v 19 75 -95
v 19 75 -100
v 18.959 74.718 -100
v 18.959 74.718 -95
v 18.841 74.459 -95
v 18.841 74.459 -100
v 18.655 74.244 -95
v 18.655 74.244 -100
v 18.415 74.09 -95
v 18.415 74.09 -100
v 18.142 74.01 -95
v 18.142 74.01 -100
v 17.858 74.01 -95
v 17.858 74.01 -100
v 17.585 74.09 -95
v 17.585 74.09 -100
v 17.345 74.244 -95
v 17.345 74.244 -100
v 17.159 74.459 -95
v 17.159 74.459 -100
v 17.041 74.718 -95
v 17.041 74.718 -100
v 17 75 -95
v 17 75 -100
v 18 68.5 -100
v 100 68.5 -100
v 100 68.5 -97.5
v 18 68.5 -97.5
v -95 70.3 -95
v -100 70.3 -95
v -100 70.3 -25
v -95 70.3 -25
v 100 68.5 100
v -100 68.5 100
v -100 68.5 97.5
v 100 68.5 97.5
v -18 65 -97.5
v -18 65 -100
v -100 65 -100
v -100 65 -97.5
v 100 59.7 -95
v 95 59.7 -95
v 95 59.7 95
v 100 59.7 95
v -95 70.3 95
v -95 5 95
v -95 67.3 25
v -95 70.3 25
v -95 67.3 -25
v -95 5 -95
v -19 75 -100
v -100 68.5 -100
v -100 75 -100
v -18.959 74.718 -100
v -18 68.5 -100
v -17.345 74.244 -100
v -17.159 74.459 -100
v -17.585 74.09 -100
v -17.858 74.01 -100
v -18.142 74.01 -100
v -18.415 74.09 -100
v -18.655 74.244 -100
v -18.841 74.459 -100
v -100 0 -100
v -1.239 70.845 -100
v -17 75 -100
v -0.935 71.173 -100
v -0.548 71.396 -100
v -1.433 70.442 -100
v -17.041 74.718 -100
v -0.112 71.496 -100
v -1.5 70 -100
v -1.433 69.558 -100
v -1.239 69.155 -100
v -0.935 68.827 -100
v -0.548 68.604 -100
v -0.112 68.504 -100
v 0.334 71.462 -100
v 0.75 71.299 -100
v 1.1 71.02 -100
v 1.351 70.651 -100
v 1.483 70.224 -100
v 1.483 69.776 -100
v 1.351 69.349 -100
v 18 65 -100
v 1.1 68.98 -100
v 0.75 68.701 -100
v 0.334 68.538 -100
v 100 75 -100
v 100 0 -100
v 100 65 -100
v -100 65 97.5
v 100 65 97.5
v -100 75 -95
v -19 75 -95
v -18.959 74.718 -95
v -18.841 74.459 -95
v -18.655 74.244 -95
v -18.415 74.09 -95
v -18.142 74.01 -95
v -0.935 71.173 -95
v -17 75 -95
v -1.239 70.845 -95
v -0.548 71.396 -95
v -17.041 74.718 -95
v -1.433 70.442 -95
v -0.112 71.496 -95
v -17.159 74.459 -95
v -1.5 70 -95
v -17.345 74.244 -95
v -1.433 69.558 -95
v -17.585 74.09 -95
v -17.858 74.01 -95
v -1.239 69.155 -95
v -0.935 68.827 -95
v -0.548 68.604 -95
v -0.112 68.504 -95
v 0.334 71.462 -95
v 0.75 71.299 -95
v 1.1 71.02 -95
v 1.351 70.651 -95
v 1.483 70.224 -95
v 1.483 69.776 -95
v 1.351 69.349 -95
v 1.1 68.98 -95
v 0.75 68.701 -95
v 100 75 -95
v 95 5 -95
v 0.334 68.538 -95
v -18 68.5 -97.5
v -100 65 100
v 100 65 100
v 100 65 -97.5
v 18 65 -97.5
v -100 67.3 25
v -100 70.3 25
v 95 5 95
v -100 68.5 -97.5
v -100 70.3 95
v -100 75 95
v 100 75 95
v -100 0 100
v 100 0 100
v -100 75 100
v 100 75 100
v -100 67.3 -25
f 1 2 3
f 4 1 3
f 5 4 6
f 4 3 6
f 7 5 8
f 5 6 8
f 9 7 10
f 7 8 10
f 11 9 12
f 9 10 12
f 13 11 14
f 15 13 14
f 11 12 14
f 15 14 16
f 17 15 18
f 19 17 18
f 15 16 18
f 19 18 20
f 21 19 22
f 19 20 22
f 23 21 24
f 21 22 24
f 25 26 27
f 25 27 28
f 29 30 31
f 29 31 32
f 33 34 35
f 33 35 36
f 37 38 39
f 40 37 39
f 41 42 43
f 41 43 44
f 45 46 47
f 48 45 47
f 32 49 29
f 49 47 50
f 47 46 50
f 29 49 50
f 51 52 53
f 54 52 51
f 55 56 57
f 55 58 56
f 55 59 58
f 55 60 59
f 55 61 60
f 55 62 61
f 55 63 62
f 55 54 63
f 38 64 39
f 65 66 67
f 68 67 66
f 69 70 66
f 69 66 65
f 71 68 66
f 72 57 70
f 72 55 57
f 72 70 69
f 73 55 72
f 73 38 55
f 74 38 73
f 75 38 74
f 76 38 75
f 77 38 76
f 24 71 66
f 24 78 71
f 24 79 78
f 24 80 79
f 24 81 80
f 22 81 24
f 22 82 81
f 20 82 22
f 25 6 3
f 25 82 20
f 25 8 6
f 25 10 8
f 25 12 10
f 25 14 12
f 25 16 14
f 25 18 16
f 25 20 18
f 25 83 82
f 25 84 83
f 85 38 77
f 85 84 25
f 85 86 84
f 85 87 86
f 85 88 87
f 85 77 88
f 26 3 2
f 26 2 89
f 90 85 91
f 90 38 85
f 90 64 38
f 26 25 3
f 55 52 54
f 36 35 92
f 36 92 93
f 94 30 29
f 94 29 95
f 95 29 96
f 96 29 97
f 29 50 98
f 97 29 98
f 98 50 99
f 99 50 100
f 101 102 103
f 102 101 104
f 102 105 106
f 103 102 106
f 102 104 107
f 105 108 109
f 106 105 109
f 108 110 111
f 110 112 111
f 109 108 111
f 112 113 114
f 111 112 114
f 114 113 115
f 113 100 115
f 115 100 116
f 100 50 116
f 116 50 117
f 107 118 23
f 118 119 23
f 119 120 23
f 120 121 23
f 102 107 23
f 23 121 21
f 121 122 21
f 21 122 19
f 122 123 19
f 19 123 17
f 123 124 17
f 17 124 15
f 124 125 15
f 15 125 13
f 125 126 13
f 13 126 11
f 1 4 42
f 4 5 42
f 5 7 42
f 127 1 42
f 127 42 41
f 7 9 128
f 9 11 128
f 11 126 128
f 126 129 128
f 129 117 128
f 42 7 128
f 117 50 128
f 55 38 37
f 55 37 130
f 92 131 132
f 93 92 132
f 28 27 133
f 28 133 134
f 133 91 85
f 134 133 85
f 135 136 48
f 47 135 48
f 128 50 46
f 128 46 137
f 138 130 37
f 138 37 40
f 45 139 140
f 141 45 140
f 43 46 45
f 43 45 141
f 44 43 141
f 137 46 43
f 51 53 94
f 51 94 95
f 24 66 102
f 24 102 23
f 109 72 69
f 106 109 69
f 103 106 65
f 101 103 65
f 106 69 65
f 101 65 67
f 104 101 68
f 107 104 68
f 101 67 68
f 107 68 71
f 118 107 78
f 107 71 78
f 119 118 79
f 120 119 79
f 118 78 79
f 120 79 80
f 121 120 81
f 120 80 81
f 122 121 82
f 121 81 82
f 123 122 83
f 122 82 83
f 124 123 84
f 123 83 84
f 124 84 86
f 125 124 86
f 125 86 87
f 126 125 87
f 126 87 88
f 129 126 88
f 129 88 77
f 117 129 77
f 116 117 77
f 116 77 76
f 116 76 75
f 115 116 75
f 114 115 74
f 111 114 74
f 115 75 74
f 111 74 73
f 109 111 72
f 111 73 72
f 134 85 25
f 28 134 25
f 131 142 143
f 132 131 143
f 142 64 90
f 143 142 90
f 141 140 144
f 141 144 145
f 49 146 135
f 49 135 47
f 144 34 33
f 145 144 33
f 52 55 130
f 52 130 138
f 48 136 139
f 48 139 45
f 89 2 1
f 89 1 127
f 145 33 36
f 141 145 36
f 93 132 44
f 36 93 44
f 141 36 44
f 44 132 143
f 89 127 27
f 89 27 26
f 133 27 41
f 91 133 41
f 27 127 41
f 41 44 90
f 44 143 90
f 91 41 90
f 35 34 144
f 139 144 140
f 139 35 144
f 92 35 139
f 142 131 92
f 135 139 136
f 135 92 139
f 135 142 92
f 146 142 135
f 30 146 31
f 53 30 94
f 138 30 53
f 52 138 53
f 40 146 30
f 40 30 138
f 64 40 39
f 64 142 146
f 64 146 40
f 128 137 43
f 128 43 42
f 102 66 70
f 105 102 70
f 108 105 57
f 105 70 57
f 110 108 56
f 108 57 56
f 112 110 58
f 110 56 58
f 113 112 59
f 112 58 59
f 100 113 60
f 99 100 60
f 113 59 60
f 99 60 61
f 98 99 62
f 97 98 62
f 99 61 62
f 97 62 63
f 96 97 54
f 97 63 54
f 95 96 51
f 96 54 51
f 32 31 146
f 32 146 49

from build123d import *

# Parameters (mm, degrees)
SKETCH_1_W               = 200
SKETCH_1_H               = 200
EXTRUDE_2_DEPTH          = 5
SKETCH_2_W               = 200
SKETCH_2_H               = 5
EXTRUDE_3_DEPTH          = 70
SKETCH_3_W               = 5
SKETCH_3_H               = 190
EXTRUDE_4_DEPTH          = 54.7
SKETCH_4_W               = 200
SKETCH_4_H               = 5
EXTRUDE_5_DEPTH          = 70
SKETCH_14_W              = 5
SKETCH_14_H              = 190
EXTRUDE_7_DEPTH          = 65.3
SKETCH_15_W              = 5
SKETCH_15_H              = 50
CUT_EXTRUDE_7_DEPTH      = 3
CUT_EXTRUDE_8_DEPTH      = 1
CUT_EXTRUDE_8_DEPTH_BACK = 5
CUT_EXTRUDE_9_DEPTH      = 1
CUT_EXTRUDE_9_DEPTH_BACK = 5
SKETCH_19_R              = 1.5
CUT_EXTRUDE_10_DEPTH     = 5
SKETCH_20_W              = 200
SKETCH_20_H              = 3.5
CUT_EXTRUDE_11_DEPTH     = 2.5
SKETCH_21_W              = 82
SKETCH_21_H              = 3.5
CUT_EXTRUDE_13_DEPTH     = 2.5


with BuildPart() as part:
    # Эскиз1 → Бобышка-Вытянуть2 (new body)
    with BuildSketch(Plane(origin=(0, 0, 0), x_dir=(1, 0, 0), z_dir=(0, 1, 0))):
        Rectangle(SKETCH_1_W, SKETCH_1_H)
    extrude(amount=EXTRUDE_2_DEPTH)

    # Эскиз2 → Бобышка-Вытянуть3 (add)
    with BuildSketch(Plane(origin=(0, 5, 0), x_dir=(1, 0, 0), z_dir=(0, 1, 0))):
        with Locations((0, -97.5)):
            Rectangle(SKETCH_2_W, SKETCH_2_H)
    extrude(amount=EXTRUDE_3_DEPTH)

    # Эскиз3 → Бобышка-Вытянуть4 (add)
    with BuildSketch(Plane(origin=(0, 5, 0), x_dir=(1, 0, 0), z_dir=(0, 1, 0))):
        with Locations((97.5, 0)):
            Rectangle(SKETCH_3_W, SKETCH_3_H)
    extrude(amount=EXTRUDE_4_DEPTH)

    # Эскиз4 → Бобышка-Вытянуть5 (add)
    with BuildSketch(Plane(origin=(0, 5, 0), x_dir=(1, 0, 0), z_dir=(0, 1, 0))):
        with Locations((0, 97.5)):
            Rectangle(SKETCH_4_W, SKETCH_4_H)
    extrude(amount=EXTRUDE_5_DEPTH)

    # Эскиз14 → Бобышка-Вытянуть7 (add)
    with BuildSketch(Plane(origin=(0, 5, 0), x_dir=(1, 0, 0), z_dir=(0, 1, 0))):
        with Locations((-97.5, 0)):
            Rectangle(SKETCH_14_W, SKETCH_14_H)
    extrude(amount=EXTRUDE_7_DEPTH)

    # Эскиз15 → Вырез-Вытянуть7 (cut)
    with BuildSketch(Plane(origin=(0, 70.3, 0), x_dir=(1, 0, 0), z_dir=(0, 1, 0))):
        with Locations((-97.5, 0)):
            Rectangle(SKETCH_15_W, SKETCH_15_H)
    extrude(amount=-CUT_EXTRUDE_7_DEPTH, mode=Mode.SUBTRACT)

    # Эскиз16 → Вырез-Вытянуть8 (cut, two sides)
    with BuildSketch(Plane(origin=(0, 0, -100), x_dir=(-1, 0, 0), z_dir=(0, 0, -1))) as cut_extrude_8_sk:
        with BuildLine():
            Line((-19, 366.325434328), (-19, 75))
            ThreePointArc((-19, 75), (-18, 74), (-17, 75))
            Line((-17, 75), (-17, 366.325434328))
            Line((-17, 366.325434328), (-17, 948.976302985))
            Line((-17, 948.976302985), (-19, 948.976302985))
            Line((-19, 948.976302985), (-19, 366.325434328))
        make_face()
    extrude(amount=CUT_EXTRUDE_8_DEPTH, mode=Mode.SUBTRACT)
    extrude(cut_extrude_8_sk.sketch, amount=-CUT_EXTRUDE_8_DEPTH_BACK, mode=Mode.SUBTRACT)

    # Эскиз18 → Вырез-Вытянуть9 (cut, two sides)
    with BuildSketch(Plane(origin=(0, 0, -100), x_dir=(-1, 0, 0), z_dir=(0, 0, -1))) as cut_extrude_9_sk:
        with BuildLine():
            Line((17, 366.325434328), (17, 75))
            ThreePointArc((17, 75), (18, 74), (19, 75))
            Line((19, 75), (19, 366.325434328))
            Line((19, 366.325434328), (19, 948.976302985))
            Line((19, 948.976302985), (17, 948.976302985))
            Line((17, 948.976302985), (17, 366.325434328))
        make_face()
    extrude(amount=CUT_EXTRUDE_9_DEPTH, mode=Mode.SUBTRACT)
    extrude(cut_extrude_9_sk.sketch, amount=-CUT_EXTRUDE_9_DEPTH_BACK, mode=Mode.SUBTRACT)

    # Эскиз19 → Вырез-Вытянуть10 (cut)
    with BuildSketch(Plane(origin=(0, 0, -100), x_dir=(-1, 0, 0), z_dir=(0, 0, -1))):
        with Locations((0, 70)):
            Circle(SKETCH_19_R)
    extrude(amount=-CUT_EXTRUDE_10_DEPTH, mode=Mode.SUBTRACT)

    # Эскиз20 → Вырез-Вытянуть11 (cut)
    with BuildSketch(Plane.XY.offset(100)):
        with Locations((0, 66.75)):
            Rectangle(SKETCH_20_W, SKETCH_20_H)
    extrude(amount=-CUT_EXTRUDE_11_DEPTH, mode=Mode.SUBTRACT)

    # Эскиз21 → Вырез-Вытянуть13 (cut)
    with BuildSketch(Plane(origin=(0, 0, -100), x_dir=(-1, 0, 0), z_dir=(0, 0, -1))):
        with Locations((-59, 66.75)):
            Rectangle(SKETCH_21_W, SKETCH_21_H)
        with Locations((59, 66.75)):
            Rectangle(SKETCH_21_W, SKETCH_21_H)
    extrude(amount=-CUT_EXTRUDE_13_DEPTH, mode=Mode.SUBTRACT)


solid = part.part
